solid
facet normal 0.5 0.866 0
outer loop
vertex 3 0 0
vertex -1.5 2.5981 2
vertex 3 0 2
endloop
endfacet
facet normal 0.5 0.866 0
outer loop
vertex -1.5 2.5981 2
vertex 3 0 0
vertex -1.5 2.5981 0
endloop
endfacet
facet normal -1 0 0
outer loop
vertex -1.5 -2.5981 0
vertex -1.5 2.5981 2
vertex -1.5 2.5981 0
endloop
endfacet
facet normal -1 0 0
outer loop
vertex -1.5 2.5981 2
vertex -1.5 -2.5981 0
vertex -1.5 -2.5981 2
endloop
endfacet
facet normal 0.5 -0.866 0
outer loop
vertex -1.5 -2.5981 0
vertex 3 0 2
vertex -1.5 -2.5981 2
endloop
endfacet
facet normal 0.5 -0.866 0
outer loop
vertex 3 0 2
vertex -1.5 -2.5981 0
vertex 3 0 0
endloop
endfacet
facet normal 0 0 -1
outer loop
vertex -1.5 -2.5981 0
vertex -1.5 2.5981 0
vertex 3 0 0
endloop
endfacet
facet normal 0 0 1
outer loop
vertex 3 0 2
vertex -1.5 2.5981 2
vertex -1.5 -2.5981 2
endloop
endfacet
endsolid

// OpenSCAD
// Compiles to (1/0 -> inf): cylinder($fn=inf, ...); sphere(... r=inf); etc.
// SYMPTOM: every statement containing inf/nan was dropped. stderr showed
//   "syntax error near 'inf' (token ID)" per line, and PLY error recovery
//   discarded the WHOLE statement -- so a finite primitive whose only oddity
//   was $fn=inf vanished, and t3d__primitive-inf-tests.csg imported as nothing
//   where OpenSCAD renders two real solids.
// CAUSE: OpenSCAD emits inf/nan as bare tokens and its CSG reader treats them as
//   an unknown variable -> undef. FreeCAD's lexer (tokrules.py t_ID) tokenised
//   them as identifiers, hitting the grammar where a NUMBER was expected.
// FIX: tokrules.py lexes inf/nan (case-insensitive) as NUMBER so the parser
//   never derails; importCSG.py guards the consumers to match undef semantics:
//   non-finite $fn (circle/cylinder) -> unset -> smooth (int(round(inf)) would
//   also OverflowError); non-finite dimension (square/circle/sphere/cube/
//   cylinder) -> empty; non-finite vertex (polygon/polyhedron, via
//   all_points_finite) -> empty. Commit 61d6b153f3.
// EXPECTED (OpenSCAD): $fn=inf is undef -> default facets -> the cylinder RENDERS
//   smooth, V = pi*r^2*h = pi*9*2 = 18*pi; the inf-radius sphere is EMPTY.
cylinder($fn = 1/0, h = 2, r1 = 3, r2 = 3);
sphere(r = 1/0);
